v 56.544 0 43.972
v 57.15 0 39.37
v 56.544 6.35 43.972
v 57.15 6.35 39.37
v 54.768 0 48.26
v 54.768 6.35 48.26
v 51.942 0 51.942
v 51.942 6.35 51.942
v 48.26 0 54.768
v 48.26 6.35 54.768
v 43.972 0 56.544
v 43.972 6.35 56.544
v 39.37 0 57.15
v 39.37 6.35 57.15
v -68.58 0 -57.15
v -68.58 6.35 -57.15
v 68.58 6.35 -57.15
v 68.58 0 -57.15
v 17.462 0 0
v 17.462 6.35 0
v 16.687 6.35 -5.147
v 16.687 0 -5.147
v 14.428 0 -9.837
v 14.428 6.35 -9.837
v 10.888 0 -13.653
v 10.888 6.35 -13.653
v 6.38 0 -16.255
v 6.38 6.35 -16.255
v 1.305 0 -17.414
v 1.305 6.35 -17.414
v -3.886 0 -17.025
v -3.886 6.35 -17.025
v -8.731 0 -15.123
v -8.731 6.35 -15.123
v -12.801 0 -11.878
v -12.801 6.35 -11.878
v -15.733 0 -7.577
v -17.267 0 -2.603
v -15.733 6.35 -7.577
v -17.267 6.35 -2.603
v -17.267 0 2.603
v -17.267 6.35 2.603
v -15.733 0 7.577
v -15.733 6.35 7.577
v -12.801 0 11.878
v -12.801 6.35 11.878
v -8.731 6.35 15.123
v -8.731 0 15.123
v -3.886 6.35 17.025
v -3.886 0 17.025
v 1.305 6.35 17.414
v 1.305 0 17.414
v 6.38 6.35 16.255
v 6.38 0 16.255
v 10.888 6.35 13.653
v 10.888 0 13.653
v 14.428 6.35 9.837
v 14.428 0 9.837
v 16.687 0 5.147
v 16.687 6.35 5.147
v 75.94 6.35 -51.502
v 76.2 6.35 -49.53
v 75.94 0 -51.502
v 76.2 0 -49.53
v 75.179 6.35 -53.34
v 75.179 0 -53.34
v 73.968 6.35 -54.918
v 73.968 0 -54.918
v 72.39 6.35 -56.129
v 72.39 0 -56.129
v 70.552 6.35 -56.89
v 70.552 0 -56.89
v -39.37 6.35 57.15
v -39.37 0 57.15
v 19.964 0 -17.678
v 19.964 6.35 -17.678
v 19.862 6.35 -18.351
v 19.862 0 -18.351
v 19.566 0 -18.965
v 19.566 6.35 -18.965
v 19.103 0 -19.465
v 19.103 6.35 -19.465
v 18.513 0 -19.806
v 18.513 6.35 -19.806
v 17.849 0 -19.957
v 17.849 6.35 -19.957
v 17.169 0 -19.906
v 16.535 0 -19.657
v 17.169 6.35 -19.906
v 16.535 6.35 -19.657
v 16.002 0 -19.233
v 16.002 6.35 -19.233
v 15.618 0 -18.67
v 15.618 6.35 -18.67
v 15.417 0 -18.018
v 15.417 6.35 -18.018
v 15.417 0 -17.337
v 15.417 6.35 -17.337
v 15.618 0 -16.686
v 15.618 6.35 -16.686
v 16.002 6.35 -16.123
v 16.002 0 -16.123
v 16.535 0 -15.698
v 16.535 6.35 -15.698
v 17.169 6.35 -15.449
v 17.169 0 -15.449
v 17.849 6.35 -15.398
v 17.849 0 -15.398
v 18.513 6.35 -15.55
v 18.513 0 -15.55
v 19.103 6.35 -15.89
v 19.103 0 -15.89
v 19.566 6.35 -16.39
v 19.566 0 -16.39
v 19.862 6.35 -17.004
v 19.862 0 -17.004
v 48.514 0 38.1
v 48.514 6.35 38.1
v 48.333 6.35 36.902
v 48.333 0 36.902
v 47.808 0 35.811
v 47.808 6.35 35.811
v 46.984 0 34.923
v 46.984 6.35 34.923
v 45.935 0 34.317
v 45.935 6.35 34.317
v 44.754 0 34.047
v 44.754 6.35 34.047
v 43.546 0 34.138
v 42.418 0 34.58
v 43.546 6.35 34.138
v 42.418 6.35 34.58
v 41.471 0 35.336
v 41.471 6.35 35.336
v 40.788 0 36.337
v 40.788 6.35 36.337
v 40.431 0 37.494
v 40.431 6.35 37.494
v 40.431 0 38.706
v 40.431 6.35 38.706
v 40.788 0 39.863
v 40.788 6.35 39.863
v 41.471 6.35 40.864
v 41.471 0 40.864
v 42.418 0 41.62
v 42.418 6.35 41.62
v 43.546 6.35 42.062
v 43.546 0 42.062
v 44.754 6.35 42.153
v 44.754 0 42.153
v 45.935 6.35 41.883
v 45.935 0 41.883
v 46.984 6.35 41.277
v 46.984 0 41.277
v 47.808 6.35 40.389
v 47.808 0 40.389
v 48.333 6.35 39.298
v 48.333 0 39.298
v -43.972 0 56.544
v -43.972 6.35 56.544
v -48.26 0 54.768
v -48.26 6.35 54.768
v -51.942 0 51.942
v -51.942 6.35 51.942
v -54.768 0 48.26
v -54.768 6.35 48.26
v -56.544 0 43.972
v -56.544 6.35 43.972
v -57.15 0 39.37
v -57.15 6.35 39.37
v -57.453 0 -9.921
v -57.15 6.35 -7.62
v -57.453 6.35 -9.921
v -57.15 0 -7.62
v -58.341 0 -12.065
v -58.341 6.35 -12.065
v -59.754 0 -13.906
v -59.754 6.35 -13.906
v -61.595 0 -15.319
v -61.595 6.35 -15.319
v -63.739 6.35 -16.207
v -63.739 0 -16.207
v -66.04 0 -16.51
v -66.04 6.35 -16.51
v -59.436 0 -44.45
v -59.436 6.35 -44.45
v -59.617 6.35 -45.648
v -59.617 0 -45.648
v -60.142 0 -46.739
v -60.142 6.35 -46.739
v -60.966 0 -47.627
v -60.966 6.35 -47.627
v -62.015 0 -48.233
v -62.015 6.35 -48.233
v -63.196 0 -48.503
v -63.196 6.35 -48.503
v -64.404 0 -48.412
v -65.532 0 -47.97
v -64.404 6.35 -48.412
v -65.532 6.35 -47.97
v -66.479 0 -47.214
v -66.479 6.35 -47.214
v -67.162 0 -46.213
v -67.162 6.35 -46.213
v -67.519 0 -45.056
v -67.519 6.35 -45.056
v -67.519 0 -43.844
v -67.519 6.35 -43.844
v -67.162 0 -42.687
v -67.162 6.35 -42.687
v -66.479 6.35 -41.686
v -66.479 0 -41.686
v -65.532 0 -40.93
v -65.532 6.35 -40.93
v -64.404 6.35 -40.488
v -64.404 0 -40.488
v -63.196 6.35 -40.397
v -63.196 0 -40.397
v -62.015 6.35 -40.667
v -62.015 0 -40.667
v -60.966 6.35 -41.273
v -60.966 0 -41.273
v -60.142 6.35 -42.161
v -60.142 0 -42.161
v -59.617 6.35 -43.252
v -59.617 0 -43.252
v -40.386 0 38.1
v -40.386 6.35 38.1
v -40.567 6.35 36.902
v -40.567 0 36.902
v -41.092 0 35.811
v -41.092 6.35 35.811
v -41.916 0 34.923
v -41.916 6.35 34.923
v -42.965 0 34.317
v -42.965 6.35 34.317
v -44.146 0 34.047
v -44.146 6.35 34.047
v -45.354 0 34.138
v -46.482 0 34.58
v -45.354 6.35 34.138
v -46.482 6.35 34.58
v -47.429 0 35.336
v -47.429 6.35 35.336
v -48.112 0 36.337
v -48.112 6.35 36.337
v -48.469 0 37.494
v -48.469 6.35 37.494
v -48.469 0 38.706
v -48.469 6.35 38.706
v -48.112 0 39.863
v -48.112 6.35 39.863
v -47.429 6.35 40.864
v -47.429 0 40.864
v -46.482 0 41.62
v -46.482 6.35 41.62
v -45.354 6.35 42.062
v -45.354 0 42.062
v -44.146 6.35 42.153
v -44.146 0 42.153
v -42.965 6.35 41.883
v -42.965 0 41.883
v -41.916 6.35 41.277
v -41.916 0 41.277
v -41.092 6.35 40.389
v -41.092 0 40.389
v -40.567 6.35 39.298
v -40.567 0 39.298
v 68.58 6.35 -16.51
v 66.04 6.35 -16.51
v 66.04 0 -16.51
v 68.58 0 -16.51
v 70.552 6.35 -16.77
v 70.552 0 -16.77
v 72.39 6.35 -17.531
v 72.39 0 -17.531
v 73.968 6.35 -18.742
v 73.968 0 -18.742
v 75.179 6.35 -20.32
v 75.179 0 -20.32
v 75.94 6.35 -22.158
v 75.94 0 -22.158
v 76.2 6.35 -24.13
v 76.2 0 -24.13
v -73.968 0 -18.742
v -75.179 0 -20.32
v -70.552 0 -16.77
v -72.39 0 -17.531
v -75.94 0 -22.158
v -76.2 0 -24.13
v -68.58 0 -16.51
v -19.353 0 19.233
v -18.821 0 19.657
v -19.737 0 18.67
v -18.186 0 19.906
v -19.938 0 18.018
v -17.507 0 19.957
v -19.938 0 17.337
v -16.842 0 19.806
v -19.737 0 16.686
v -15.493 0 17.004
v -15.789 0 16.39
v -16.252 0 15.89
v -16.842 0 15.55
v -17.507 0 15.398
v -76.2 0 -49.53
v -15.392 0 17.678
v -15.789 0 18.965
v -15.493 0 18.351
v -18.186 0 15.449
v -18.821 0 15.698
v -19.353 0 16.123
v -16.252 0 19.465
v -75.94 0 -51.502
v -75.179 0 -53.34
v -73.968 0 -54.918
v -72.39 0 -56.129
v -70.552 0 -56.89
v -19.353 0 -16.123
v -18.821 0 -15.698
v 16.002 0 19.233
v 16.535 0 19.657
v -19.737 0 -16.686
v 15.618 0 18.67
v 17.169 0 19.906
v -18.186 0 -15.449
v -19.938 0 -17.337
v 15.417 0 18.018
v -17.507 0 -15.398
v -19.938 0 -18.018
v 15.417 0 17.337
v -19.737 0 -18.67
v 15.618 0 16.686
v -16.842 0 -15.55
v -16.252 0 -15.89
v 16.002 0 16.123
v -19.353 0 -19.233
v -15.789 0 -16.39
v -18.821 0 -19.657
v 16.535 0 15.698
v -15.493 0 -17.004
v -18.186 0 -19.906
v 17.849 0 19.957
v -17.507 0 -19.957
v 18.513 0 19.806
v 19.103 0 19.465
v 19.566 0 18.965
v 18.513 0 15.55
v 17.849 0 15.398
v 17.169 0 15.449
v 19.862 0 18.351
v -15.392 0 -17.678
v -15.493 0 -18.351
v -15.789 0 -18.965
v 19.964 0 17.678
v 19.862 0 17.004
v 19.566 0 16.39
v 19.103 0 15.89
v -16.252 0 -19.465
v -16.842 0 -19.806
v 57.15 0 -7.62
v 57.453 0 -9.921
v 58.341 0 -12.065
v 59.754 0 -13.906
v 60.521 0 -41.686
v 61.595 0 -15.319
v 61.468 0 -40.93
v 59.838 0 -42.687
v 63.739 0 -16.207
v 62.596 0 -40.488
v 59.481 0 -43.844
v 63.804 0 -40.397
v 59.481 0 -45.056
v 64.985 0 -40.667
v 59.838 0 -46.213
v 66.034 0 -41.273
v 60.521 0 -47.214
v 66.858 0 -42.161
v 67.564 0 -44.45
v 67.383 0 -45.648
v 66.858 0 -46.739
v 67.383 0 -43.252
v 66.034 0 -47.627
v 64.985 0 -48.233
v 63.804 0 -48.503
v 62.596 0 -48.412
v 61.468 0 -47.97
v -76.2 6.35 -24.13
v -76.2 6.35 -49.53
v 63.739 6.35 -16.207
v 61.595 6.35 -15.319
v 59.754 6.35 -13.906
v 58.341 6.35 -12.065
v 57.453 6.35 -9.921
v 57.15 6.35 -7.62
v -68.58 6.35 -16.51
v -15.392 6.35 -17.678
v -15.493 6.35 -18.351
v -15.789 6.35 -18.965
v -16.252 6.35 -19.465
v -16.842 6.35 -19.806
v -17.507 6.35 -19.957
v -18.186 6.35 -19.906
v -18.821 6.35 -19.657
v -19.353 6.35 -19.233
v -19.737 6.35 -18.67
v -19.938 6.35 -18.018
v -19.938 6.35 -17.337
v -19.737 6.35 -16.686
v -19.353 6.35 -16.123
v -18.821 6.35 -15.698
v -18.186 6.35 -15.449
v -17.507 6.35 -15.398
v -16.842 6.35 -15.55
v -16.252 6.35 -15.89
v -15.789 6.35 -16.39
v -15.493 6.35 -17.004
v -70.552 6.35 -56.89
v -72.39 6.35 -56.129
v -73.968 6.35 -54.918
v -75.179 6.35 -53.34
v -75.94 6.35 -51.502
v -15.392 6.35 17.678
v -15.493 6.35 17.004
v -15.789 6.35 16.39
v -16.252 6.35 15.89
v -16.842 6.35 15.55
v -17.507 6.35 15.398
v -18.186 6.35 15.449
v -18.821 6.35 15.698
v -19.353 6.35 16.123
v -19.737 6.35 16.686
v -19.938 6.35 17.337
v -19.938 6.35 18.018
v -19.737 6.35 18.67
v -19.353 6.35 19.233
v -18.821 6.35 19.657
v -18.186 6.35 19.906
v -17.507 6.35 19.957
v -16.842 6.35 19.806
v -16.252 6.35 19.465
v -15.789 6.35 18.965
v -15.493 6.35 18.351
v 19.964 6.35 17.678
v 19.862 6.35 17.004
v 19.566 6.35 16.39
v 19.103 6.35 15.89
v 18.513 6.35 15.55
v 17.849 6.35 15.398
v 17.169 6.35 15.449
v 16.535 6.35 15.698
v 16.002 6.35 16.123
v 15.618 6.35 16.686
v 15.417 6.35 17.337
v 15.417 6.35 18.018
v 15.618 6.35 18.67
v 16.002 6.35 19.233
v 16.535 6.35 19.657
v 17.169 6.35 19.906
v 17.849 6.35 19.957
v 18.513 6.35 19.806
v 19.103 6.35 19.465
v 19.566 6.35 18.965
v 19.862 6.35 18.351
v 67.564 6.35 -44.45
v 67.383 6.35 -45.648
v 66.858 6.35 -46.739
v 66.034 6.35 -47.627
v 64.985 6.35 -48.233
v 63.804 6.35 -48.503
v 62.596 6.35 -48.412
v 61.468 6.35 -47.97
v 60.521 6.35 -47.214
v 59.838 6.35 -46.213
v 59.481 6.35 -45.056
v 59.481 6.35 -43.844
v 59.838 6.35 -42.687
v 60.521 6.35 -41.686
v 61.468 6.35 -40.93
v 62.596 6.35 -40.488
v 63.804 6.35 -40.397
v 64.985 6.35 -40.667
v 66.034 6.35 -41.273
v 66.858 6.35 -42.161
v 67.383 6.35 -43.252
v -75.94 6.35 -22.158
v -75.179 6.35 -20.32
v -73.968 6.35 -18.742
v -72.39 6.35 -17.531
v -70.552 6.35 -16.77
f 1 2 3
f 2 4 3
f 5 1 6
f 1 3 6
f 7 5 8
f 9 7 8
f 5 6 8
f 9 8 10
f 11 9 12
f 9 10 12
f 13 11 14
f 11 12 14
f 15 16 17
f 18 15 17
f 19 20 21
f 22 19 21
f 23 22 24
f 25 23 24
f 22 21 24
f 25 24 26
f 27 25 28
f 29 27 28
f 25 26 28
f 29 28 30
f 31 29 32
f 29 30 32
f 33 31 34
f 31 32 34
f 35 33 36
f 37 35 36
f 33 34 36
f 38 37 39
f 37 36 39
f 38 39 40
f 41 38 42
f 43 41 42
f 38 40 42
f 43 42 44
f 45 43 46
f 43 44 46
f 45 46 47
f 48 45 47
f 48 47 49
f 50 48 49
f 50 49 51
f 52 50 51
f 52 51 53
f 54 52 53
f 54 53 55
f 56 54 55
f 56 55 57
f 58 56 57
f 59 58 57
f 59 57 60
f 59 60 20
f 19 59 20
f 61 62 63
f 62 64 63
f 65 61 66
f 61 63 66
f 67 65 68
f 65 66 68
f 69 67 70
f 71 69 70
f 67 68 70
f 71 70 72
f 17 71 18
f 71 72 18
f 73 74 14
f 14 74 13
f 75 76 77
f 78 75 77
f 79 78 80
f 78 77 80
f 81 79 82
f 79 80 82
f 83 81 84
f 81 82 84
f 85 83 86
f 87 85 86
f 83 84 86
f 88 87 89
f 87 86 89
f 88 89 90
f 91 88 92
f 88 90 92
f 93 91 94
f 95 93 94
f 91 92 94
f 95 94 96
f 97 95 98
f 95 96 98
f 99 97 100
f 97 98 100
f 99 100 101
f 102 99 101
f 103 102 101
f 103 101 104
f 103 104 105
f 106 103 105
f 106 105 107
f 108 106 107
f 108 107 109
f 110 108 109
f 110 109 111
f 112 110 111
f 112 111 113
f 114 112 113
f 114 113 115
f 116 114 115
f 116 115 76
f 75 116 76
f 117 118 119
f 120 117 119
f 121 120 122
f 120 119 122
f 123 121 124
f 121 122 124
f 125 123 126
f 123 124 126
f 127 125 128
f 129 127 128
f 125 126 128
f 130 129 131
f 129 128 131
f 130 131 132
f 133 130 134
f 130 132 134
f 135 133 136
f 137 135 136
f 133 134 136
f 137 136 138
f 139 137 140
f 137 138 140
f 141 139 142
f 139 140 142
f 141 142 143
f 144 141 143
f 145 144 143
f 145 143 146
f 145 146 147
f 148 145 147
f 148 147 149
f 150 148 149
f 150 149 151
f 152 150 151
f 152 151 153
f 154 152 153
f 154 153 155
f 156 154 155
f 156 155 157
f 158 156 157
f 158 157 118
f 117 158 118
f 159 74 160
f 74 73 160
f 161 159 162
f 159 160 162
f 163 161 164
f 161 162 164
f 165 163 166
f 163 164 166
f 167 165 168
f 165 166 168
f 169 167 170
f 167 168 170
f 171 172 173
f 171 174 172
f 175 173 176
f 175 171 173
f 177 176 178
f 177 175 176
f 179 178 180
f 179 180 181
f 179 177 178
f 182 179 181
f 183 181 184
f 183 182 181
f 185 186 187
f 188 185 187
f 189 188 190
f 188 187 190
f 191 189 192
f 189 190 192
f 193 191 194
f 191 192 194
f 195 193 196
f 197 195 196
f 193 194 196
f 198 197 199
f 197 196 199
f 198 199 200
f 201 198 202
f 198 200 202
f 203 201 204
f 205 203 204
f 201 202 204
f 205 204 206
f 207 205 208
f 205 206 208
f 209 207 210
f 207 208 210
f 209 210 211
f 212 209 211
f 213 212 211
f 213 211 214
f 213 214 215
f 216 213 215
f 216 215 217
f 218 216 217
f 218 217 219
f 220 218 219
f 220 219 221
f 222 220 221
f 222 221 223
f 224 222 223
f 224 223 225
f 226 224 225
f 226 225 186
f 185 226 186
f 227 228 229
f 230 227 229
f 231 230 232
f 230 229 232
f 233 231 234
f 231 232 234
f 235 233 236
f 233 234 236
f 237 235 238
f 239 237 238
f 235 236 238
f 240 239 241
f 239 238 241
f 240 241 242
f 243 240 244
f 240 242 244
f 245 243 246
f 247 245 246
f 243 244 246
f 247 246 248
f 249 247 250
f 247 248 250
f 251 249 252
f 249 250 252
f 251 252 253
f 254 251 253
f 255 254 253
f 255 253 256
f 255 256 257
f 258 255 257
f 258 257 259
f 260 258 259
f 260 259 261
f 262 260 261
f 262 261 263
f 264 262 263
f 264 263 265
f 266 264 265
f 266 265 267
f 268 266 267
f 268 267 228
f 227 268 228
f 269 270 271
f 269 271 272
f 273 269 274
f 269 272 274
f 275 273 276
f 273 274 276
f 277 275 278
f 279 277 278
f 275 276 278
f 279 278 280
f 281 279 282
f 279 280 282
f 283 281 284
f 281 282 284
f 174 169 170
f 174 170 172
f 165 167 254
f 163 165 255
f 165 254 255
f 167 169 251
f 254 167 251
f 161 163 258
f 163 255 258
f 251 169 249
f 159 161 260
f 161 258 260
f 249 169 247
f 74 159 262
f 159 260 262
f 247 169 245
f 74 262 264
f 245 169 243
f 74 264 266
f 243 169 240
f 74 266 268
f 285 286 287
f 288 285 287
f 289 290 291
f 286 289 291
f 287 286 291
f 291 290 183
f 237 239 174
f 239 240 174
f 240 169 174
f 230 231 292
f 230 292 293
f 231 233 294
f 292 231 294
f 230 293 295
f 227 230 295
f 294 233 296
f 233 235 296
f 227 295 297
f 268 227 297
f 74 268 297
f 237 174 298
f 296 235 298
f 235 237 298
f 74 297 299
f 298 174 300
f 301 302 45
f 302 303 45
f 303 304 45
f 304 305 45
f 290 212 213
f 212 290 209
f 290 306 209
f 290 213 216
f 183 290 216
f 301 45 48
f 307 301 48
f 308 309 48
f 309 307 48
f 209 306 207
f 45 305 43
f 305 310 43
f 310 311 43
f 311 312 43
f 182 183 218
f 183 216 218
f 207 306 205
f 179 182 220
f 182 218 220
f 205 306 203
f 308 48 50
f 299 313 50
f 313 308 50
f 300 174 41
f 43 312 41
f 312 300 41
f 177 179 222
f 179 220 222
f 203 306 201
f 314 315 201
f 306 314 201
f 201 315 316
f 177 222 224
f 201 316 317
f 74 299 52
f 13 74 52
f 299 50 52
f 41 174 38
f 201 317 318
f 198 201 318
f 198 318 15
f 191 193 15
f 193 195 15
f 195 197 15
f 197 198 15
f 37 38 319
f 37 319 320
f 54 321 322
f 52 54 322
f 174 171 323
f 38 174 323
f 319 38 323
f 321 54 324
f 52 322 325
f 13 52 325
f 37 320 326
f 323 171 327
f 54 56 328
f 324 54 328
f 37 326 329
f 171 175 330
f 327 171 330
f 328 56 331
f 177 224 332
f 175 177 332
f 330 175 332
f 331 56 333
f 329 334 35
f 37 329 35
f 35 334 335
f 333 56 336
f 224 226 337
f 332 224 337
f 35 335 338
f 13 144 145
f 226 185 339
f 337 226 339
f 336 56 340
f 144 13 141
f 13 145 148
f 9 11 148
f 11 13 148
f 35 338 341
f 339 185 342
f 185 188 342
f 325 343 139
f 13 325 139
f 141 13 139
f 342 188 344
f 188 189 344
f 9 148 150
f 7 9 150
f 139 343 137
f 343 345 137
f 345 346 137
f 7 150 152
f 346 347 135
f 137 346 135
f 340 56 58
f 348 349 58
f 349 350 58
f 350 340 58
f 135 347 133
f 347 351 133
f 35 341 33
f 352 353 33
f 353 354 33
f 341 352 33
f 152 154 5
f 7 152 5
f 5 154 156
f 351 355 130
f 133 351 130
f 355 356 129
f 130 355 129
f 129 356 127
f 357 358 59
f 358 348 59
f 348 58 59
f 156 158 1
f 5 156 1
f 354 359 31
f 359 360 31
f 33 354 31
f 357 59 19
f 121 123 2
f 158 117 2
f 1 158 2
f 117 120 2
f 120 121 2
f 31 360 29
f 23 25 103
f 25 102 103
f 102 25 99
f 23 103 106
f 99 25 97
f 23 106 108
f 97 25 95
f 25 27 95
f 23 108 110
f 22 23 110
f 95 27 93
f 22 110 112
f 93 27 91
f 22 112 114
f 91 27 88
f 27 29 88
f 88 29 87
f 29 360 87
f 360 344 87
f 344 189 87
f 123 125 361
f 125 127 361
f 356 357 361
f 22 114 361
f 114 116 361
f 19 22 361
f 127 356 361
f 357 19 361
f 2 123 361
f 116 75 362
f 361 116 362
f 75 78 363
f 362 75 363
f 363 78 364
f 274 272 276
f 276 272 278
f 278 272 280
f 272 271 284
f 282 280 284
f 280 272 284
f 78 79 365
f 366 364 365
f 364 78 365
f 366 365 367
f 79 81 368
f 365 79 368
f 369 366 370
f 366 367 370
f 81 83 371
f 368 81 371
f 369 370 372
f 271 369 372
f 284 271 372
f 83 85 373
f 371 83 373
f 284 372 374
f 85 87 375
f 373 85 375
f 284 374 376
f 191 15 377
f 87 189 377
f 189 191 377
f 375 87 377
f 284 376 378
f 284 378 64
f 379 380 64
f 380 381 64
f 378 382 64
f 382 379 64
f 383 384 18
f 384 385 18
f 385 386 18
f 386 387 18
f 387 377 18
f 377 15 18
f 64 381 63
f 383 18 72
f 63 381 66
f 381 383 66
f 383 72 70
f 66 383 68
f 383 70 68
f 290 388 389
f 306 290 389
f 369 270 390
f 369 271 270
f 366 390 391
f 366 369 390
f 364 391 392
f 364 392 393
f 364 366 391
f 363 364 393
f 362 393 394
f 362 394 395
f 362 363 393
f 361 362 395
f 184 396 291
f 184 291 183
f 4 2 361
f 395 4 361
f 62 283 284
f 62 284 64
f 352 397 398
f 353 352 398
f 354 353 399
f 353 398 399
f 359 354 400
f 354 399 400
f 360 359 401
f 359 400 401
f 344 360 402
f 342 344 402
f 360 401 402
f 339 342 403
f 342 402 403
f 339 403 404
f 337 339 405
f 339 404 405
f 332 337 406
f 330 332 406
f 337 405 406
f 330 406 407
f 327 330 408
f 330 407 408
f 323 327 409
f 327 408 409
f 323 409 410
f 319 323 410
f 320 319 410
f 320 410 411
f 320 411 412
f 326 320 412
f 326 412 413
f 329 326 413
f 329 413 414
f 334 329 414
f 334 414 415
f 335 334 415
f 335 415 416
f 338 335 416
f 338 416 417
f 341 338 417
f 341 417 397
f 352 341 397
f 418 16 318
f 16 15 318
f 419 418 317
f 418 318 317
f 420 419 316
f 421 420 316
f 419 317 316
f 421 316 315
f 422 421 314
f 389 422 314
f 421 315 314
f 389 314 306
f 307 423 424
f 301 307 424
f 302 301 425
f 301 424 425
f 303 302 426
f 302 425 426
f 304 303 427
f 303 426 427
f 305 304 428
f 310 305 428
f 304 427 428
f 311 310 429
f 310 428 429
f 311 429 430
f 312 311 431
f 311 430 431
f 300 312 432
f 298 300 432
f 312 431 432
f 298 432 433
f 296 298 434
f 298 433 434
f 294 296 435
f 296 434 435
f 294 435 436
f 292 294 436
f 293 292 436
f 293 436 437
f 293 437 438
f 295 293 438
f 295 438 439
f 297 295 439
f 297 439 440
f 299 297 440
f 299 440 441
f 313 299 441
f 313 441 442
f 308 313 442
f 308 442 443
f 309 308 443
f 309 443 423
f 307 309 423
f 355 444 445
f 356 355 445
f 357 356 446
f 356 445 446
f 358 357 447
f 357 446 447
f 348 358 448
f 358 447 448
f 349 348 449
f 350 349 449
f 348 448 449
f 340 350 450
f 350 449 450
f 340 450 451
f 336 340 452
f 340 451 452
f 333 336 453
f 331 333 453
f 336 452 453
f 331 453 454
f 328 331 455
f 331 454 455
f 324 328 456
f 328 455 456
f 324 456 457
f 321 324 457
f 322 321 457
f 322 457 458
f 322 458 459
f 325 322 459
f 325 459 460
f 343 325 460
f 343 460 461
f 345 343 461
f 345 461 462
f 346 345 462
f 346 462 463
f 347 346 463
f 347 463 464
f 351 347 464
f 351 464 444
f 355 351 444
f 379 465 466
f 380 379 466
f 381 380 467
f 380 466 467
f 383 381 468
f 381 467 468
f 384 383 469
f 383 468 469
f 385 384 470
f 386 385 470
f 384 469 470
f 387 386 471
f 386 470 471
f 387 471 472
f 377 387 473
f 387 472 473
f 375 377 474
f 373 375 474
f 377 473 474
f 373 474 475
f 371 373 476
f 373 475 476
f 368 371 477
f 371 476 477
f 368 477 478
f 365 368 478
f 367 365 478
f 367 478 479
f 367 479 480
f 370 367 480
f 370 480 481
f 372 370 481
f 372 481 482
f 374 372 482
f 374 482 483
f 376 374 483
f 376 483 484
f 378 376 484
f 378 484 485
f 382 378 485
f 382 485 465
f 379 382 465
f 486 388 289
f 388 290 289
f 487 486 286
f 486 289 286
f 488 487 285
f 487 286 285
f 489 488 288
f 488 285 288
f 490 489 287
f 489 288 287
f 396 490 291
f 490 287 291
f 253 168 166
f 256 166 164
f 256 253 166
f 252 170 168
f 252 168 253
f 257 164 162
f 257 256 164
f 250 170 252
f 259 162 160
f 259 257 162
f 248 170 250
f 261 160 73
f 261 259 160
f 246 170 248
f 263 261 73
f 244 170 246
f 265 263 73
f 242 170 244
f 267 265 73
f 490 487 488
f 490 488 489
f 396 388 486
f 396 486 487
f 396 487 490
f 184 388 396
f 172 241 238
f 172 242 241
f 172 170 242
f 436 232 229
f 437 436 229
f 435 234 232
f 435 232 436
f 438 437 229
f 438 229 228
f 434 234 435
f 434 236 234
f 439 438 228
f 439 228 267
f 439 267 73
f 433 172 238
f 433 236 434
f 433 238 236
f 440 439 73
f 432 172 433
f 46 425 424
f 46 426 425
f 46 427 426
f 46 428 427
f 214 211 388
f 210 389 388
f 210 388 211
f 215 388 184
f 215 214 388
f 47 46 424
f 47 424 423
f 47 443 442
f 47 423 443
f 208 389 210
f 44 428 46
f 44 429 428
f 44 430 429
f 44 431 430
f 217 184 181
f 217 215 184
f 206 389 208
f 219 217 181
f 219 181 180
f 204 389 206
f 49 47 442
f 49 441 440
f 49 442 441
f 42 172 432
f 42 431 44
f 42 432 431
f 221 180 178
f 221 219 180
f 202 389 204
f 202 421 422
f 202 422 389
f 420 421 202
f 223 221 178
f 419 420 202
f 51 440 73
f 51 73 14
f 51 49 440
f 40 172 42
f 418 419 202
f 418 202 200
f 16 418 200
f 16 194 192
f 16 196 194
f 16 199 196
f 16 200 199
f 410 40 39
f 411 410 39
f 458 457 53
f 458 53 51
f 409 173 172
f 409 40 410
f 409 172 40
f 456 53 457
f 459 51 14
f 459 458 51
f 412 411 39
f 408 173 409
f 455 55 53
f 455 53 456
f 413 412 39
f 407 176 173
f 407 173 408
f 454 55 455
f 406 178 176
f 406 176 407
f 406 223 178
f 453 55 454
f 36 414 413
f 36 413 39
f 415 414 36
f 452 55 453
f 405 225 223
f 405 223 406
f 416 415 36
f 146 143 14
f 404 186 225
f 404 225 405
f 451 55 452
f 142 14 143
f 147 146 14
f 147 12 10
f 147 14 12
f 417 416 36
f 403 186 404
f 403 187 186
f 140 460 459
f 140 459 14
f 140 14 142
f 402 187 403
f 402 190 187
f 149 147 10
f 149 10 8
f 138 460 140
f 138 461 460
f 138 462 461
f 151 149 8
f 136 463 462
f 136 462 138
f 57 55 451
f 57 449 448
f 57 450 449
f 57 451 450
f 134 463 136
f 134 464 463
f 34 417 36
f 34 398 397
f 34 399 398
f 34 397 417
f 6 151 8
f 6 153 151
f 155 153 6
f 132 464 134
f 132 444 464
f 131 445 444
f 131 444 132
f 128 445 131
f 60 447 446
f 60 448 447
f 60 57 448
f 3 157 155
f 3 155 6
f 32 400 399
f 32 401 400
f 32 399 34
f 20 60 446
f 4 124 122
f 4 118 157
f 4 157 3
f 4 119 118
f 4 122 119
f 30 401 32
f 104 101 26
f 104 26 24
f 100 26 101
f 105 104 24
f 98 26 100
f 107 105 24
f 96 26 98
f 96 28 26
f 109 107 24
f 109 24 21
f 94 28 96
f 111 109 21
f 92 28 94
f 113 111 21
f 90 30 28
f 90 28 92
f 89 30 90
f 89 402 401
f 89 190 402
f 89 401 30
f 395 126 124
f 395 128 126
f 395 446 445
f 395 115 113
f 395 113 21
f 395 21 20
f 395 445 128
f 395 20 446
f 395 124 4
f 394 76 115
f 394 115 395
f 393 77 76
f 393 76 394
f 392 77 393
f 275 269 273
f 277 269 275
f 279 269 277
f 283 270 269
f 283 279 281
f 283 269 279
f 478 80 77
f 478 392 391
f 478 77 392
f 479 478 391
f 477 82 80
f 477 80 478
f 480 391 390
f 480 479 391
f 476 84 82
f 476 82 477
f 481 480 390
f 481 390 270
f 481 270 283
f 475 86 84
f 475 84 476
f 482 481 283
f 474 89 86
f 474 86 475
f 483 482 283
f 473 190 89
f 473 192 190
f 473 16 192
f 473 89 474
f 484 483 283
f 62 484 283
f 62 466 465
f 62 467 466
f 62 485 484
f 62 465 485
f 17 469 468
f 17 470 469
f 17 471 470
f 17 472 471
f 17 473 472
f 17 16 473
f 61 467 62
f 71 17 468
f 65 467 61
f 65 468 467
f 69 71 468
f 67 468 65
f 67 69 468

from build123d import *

# Parameters (mm, degrees)
SKETCH1_W           = 114.3
SKETCH1_H           = 114.3
BOSS_EXTRUDE1_DEPTH = 6.35
SKETCH3_W           = 19.05
SKETCH3_H           = 40.64
BOSS_EXTRUDE2_DEPTH = 6.35
SKETCH2_R           = 4.064
SKETCH2_R_2         = 17.4625
SKETCH2_R_3         = 2.286
CUT_EXTRUDE1_DEPTH  = 7.35
FILLET1_R           = 8.89
FILLET2_R           = 17.78
FILLET3_R           = 7.62


with BuildPart() as part:
    # Sketch1 → Boss-Extrude1 (new body)
    with BuildSketch(Plane(origin=(0, 0, 0), x_dir=(1, 0, 0), z_dir=(0, 1, 0))):
        Rectangle(SKETCH1_W, SKETCH1_H)
    extrude(amount=BOSS_EXTRUDE1_DEPTH)

    # Sketch3 → Boss-Extrude2 (add)
    with BuildSketch(Plane(origin=(0, 6.35, 0), x_dir=(1, 0, 0), z_dir=(0, 1, 0))):
        with Locations((66.675, 36.83)):
            Rectangle(SKETCH3_W, SKETCH3_H)
        with Locations((-66.675, 36.83)):
            Rectangle(SKETCH3_W, SKETCH3_H)
    extrude(amount=-BOSS_EXTRUDE2_DEPTH)

    # Sketch2 → Cut-Extrude1 (cut, through all)
    with BuildSketch(Plane(origin=(0, 6.35, 0), x_dir=(1, 0, 0), z_dir=(0, 1, 0))):
        with Locations((-63.5, 44.45)):
            Circle(SKETCH2_R)
        with Locations((63.5, 44.45)):
            Circle(SKETCH2_R)
        with Locations((44.45, -38.1)):
            Circle(SKETCH2_R)
        with Locations((-44.45, -38.1)):
            Circle(SKETCH2_R)
        Circle(SKETCH2_R_2)
        with Locations((-17.67766953, 17.67766953)):
            Circle(SKETCH2_R_3)
        with Locations((17.67766953, 17.67766953)):
            Circle(SKETCH2_R_3)
        with Locations((17.67766953, -17.67766953)):
            Circle(SKETCH2_R_3)
        with Locations((-17.67766953, -17.67766953)):
            Circle(SKETCH2_R_3)
    extrude(amount=-CUT_EXTRUDE1_DEPTH, mode=Mode.SUBTRACT)

    # Fillet1
    fillet1_edges = [part.edges().sort_by_distance(p)[0] for p in [
        (57.15, 3.175, -16.51),
        (-57.15, 3.175, -16.51),
    ]]
    fillet(fillet1_edges, radius=FILLET1_R)

    # Fillet2
    fillet2_edges = [part.edges().sort_by_distance(p)[0] for p in [
        (57.15, 3.175, 57.15),
        (-57.15, 3.175, 57.15),
    ]]
    fillet(fillet2_edges, radius=FILLET2_R)

    # Fillet3
    fillet3_edges = [part.edges().sort_by_distance(p)[0] for p in [
        (76.2, 3.175, -16.51),
        (76.2, 3.175, -57.15),
        (-76.2, 3.175, -57.15),
        (-76.2, 3.175, -16.51),
    ]]
    fillet(fillet3_edges, radius=FILLET3_R)


solid = part.part
